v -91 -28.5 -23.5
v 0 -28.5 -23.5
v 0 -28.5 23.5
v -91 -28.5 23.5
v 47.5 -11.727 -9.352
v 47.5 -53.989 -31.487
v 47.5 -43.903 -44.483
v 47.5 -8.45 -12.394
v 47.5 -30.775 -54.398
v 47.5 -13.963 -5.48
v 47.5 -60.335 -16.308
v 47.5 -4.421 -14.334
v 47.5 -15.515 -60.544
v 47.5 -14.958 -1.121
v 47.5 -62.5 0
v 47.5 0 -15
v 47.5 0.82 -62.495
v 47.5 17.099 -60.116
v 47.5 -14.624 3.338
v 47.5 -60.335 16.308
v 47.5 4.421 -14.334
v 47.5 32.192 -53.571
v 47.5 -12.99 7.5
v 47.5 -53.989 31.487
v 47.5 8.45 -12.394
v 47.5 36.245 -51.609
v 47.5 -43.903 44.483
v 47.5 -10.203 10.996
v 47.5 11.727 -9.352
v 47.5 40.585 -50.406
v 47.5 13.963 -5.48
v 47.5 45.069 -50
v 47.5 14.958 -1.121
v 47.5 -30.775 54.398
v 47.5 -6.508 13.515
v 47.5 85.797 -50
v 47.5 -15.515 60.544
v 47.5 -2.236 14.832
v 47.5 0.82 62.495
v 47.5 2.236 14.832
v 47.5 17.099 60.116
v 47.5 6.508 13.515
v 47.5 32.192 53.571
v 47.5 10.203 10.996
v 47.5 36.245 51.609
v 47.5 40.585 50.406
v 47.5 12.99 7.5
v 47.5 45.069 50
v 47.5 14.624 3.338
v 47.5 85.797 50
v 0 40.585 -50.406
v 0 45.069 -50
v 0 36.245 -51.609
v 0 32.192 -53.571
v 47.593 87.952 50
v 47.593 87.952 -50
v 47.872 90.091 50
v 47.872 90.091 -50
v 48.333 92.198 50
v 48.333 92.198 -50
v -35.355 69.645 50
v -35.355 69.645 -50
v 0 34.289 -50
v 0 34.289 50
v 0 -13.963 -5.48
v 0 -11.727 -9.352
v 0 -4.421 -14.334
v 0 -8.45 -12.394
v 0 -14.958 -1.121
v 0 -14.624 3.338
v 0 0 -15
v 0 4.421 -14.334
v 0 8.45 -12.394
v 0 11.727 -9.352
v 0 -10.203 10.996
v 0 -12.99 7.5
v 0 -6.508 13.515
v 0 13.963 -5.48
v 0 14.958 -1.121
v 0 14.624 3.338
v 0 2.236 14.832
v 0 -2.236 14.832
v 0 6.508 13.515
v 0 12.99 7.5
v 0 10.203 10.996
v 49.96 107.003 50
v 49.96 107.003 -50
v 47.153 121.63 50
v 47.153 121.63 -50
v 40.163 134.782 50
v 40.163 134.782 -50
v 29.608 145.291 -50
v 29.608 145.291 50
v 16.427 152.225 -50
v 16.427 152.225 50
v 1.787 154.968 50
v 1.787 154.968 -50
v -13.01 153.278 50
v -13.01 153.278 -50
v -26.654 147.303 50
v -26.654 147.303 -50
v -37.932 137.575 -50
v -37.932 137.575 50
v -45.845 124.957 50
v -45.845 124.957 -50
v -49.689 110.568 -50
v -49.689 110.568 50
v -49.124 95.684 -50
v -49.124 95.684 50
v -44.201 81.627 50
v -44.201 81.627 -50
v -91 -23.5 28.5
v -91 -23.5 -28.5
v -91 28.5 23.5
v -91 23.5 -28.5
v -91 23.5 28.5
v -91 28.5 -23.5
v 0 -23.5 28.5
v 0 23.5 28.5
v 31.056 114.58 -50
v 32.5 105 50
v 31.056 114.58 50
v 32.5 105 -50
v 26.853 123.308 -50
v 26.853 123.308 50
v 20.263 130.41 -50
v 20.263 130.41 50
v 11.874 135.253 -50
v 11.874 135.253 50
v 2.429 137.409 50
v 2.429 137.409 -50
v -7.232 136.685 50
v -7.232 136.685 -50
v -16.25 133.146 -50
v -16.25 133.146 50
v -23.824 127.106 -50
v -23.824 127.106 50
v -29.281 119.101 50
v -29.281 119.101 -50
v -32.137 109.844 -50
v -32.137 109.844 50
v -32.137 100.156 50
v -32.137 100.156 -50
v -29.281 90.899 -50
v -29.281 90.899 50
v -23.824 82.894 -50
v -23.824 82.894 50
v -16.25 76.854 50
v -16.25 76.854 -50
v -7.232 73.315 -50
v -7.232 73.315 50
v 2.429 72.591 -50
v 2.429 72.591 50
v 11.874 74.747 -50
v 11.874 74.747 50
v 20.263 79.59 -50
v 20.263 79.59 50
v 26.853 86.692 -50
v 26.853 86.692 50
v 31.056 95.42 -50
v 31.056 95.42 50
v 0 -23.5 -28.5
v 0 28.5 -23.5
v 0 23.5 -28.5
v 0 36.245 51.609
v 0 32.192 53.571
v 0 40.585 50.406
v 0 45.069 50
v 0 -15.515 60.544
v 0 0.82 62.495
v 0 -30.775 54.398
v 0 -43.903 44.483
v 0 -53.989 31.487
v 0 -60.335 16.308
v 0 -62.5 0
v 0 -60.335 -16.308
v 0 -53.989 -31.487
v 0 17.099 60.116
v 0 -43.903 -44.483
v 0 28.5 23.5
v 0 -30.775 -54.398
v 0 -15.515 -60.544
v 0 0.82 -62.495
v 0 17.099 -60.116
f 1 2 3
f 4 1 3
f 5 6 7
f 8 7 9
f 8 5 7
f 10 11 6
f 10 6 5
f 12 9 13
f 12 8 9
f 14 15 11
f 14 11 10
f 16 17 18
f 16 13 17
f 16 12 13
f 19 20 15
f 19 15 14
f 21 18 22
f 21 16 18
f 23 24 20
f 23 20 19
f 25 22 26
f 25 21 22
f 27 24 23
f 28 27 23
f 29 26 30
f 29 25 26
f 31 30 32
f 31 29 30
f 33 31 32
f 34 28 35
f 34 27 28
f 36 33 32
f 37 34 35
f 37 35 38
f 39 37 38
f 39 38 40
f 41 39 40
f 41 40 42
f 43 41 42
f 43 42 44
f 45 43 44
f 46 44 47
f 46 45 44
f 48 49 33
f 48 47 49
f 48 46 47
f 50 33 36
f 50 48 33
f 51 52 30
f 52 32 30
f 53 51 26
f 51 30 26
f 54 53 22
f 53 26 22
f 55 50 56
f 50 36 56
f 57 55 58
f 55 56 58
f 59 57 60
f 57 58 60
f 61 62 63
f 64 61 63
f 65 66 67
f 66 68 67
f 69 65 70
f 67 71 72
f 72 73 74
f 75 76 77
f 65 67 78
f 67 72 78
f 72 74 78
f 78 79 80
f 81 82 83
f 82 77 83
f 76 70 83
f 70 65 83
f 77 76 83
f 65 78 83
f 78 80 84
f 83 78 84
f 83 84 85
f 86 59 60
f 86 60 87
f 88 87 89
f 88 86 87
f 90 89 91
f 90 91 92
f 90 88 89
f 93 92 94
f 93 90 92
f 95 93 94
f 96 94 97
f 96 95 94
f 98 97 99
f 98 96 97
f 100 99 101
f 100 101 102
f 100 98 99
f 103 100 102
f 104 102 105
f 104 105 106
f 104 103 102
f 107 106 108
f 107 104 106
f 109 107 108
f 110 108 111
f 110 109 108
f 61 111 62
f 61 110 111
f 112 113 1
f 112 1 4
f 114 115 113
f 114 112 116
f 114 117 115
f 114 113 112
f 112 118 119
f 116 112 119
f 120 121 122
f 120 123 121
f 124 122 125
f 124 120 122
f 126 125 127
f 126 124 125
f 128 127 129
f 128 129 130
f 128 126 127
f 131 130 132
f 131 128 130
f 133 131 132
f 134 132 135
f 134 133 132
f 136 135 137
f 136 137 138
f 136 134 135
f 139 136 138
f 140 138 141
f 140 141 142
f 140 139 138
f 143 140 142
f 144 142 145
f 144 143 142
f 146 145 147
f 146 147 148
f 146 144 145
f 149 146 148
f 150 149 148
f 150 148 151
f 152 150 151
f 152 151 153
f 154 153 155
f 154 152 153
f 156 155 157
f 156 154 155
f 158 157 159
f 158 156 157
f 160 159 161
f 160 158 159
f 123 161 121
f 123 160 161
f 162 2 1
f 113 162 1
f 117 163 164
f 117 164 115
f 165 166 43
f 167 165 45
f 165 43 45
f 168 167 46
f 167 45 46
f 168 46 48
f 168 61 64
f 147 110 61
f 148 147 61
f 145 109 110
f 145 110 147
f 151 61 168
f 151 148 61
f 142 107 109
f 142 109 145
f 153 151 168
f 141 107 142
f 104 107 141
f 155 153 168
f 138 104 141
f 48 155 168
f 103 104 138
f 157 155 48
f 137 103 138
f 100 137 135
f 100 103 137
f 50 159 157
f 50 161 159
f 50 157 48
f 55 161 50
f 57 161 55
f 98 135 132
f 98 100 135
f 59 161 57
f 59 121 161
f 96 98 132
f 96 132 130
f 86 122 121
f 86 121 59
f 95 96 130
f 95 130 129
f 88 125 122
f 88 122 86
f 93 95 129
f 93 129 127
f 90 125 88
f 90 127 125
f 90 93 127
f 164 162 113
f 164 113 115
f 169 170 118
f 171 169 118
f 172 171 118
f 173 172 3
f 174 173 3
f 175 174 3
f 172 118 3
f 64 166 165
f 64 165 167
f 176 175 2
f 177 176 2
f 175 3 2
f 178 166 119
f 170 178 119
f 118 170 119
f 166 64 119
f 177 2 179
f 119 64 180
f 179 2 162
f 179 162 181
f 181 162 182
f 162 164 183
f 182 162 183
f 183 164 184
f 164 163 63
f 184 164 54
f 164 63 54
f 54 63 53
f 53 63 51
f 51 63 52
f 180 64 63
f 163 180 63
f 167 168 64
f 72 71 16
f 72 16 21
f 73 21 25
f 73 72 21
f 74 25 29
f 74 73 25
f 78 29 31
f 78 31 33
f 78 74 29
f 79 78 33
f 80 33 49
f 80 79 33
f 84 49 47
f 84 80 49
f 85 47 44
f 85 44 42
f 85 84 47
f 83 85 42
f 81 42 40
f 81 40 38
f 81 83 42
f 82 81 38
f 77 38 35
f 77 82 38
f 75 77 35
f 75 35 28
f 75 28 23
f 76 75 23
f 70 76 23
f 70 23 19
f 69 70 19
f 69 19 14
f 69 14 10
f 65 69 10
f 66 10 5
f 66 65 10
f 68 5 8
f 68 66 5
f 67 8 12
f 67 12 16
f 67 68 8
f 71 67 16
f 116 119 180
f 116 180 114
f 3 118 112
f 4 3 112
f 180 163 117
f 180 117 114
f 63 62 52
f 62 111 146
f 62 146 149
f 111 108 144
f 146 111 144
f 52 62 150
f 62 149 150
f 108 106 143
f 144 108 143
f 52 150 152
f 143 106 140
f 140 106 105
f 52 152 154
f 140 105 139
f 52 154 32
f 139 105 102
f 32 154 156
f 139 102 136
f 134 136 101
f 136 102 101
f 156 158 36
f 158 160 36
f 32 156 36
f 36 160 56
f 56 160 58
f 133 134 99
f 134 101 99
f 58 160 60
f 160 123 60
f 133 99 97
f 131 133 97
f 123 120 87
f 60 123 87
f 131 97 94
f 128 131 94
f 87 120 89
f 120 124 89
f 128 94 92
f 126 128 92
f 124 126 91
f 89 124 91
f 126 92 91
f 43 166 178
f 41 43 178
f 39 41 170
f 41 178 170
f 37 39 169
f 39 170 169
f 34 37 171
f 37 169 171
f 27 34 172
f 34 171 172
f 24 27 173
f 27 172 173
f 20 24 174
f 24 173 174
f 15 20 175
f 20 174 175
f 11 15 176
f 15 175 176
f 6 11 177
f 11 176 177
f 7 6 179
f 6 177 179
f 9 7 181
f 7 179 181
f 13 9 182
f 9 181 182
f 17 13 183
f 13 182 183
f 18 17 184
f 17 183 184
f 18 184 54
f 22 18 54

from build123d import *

# Parameters (mm, degrees)
SKETCH1_R           = 62.5
SKETCH1_R_2         = 15
BOSS_EXTRUDE1_DEPTH = 47.5
SKETCH2_R           = 32.5
BOSS_EXTRUDE2_DEPTH = 50
BOSS_EXTRUDE3_START = -47.5
BOSS_EXTRUDE3_DEPTH = 47.5
BOSS_EXTRUDE4_DEPTH = 100
FILLET1_R           = 25
SKETCH5_W           = 57
SKETCH5_H           = 57
BOSS_EXTRUDE5_DEPTH = 91
CHAMFER1_SIZE       = 5


with BuildPart() as part:
    # Sketch1 → Boss-Extrude1 (new body)
    with BuildSketch(Plane(origin=(0, 0, 0), x_dir=(0, 0, -1), z_dir=(1, 0, 0))):
        Circle(SKETCH1_R)
        Circle(SKETCH1_R_2, mode=Mode.SUBTRACT)
    extrude(amount=BOSS_EXTRUDE1_DEPTH)

    # Sketch2 → Boss-Extrude2 (add, symmetric)
    with BuildSketch(Plane.XY):
        with BuildLine():
            Line((-35.355339059, 69.644660941), (0, 34.289321881))
            Line((0, 34.289321881), (0, 55))
            ThreePointArc((0, 55), (19.134171618, 151.193976626), (-35.355339059, 69.644660941))
        make_face()
        with Locations((0, 105)):
            Circle(SKETCH2_R, mode=Mode.SUBTRACT)
    extrude(amount=BOSS_EXTRUDE2_DEPTH, both=True)

    # Sketch3 → Boss-Extrude3 (add)
    with BuildSketch(Plane(origin=(47.5, 0, 0), x_dir=(0, 0, -1), z_dir=(1, 0, 0)).offset(BOSS_EXTRUDE3_START)):
        with BuildLine():
            Line((-50, 55), (-50, 62.5))
            Line((-50, 62.5), (50, 62.5))
            Line((50, 62.5), (50, 55))
            Line((50, 55), (50, 37.5))
            ThreePointArc((50, 37.5), (40.792418173, 47.352176503), (29.685855218, 55))
            Line((29.685855218, 55), (-29.685855218, 55))
            ThreePointArc((-29.685855218, 55), (-40.792418173, 47.352176503), (-50, 37.5))
            Line((-50, 37.5), (-50, 55))
        make_face()
    extrude(amount=BOSS_EXTRUDE3_DEPTH)

    # Sketch4 → Boss-Extrude4 (add)
    with BuildSketch(Plane.XY.offset(50)):
        with BuildLine():
            Line((26.339134382, 62.5), (47.5, 62.5))
            Line((47.5, 62.5), (47.5, 89.387505004))
            ThreePointArc((47.5, 89.387505004), (39.291079432, 74.07733716), (26.339134382, 62.5))
        make_face()
    extrude(amount=-BOSS_EXTRUDE4_DEPTH)

    # Fillet1
    fillet1_edges = [part.edges().sort_by_distance(p)[0] for p in [
        (23.75, 37.5, 50),
        (23.75, 37.5, -50),
        (47.5, 89.387505004, 0),
    ]]
    fillet(fillet1_edges, radius=FILLET1_R)

    # Sketch5 → Boss-Extrude5 (add)
    with BuildSketch(Plane.ZY):
        Rectangle(SKETCH5_W, SKETCH5_H)
    extrude(amount=BOSS_EXTRUDE5_DEPTH)

    # Chamfer1
    chamfer1_edges = [part.edges().sort_by_distance(p)[0] for p in [
        (-45.5, -28.5, 28.5),
        (-45.5, 28.5, 28.5),
        (-45.5, 28.5, -28.5),
        (-45.5, -28.5, -28.5),
    ]]
    chamfer(chamfer1_edges, length=CHAMFER1_SIZE)


solid = part.part
